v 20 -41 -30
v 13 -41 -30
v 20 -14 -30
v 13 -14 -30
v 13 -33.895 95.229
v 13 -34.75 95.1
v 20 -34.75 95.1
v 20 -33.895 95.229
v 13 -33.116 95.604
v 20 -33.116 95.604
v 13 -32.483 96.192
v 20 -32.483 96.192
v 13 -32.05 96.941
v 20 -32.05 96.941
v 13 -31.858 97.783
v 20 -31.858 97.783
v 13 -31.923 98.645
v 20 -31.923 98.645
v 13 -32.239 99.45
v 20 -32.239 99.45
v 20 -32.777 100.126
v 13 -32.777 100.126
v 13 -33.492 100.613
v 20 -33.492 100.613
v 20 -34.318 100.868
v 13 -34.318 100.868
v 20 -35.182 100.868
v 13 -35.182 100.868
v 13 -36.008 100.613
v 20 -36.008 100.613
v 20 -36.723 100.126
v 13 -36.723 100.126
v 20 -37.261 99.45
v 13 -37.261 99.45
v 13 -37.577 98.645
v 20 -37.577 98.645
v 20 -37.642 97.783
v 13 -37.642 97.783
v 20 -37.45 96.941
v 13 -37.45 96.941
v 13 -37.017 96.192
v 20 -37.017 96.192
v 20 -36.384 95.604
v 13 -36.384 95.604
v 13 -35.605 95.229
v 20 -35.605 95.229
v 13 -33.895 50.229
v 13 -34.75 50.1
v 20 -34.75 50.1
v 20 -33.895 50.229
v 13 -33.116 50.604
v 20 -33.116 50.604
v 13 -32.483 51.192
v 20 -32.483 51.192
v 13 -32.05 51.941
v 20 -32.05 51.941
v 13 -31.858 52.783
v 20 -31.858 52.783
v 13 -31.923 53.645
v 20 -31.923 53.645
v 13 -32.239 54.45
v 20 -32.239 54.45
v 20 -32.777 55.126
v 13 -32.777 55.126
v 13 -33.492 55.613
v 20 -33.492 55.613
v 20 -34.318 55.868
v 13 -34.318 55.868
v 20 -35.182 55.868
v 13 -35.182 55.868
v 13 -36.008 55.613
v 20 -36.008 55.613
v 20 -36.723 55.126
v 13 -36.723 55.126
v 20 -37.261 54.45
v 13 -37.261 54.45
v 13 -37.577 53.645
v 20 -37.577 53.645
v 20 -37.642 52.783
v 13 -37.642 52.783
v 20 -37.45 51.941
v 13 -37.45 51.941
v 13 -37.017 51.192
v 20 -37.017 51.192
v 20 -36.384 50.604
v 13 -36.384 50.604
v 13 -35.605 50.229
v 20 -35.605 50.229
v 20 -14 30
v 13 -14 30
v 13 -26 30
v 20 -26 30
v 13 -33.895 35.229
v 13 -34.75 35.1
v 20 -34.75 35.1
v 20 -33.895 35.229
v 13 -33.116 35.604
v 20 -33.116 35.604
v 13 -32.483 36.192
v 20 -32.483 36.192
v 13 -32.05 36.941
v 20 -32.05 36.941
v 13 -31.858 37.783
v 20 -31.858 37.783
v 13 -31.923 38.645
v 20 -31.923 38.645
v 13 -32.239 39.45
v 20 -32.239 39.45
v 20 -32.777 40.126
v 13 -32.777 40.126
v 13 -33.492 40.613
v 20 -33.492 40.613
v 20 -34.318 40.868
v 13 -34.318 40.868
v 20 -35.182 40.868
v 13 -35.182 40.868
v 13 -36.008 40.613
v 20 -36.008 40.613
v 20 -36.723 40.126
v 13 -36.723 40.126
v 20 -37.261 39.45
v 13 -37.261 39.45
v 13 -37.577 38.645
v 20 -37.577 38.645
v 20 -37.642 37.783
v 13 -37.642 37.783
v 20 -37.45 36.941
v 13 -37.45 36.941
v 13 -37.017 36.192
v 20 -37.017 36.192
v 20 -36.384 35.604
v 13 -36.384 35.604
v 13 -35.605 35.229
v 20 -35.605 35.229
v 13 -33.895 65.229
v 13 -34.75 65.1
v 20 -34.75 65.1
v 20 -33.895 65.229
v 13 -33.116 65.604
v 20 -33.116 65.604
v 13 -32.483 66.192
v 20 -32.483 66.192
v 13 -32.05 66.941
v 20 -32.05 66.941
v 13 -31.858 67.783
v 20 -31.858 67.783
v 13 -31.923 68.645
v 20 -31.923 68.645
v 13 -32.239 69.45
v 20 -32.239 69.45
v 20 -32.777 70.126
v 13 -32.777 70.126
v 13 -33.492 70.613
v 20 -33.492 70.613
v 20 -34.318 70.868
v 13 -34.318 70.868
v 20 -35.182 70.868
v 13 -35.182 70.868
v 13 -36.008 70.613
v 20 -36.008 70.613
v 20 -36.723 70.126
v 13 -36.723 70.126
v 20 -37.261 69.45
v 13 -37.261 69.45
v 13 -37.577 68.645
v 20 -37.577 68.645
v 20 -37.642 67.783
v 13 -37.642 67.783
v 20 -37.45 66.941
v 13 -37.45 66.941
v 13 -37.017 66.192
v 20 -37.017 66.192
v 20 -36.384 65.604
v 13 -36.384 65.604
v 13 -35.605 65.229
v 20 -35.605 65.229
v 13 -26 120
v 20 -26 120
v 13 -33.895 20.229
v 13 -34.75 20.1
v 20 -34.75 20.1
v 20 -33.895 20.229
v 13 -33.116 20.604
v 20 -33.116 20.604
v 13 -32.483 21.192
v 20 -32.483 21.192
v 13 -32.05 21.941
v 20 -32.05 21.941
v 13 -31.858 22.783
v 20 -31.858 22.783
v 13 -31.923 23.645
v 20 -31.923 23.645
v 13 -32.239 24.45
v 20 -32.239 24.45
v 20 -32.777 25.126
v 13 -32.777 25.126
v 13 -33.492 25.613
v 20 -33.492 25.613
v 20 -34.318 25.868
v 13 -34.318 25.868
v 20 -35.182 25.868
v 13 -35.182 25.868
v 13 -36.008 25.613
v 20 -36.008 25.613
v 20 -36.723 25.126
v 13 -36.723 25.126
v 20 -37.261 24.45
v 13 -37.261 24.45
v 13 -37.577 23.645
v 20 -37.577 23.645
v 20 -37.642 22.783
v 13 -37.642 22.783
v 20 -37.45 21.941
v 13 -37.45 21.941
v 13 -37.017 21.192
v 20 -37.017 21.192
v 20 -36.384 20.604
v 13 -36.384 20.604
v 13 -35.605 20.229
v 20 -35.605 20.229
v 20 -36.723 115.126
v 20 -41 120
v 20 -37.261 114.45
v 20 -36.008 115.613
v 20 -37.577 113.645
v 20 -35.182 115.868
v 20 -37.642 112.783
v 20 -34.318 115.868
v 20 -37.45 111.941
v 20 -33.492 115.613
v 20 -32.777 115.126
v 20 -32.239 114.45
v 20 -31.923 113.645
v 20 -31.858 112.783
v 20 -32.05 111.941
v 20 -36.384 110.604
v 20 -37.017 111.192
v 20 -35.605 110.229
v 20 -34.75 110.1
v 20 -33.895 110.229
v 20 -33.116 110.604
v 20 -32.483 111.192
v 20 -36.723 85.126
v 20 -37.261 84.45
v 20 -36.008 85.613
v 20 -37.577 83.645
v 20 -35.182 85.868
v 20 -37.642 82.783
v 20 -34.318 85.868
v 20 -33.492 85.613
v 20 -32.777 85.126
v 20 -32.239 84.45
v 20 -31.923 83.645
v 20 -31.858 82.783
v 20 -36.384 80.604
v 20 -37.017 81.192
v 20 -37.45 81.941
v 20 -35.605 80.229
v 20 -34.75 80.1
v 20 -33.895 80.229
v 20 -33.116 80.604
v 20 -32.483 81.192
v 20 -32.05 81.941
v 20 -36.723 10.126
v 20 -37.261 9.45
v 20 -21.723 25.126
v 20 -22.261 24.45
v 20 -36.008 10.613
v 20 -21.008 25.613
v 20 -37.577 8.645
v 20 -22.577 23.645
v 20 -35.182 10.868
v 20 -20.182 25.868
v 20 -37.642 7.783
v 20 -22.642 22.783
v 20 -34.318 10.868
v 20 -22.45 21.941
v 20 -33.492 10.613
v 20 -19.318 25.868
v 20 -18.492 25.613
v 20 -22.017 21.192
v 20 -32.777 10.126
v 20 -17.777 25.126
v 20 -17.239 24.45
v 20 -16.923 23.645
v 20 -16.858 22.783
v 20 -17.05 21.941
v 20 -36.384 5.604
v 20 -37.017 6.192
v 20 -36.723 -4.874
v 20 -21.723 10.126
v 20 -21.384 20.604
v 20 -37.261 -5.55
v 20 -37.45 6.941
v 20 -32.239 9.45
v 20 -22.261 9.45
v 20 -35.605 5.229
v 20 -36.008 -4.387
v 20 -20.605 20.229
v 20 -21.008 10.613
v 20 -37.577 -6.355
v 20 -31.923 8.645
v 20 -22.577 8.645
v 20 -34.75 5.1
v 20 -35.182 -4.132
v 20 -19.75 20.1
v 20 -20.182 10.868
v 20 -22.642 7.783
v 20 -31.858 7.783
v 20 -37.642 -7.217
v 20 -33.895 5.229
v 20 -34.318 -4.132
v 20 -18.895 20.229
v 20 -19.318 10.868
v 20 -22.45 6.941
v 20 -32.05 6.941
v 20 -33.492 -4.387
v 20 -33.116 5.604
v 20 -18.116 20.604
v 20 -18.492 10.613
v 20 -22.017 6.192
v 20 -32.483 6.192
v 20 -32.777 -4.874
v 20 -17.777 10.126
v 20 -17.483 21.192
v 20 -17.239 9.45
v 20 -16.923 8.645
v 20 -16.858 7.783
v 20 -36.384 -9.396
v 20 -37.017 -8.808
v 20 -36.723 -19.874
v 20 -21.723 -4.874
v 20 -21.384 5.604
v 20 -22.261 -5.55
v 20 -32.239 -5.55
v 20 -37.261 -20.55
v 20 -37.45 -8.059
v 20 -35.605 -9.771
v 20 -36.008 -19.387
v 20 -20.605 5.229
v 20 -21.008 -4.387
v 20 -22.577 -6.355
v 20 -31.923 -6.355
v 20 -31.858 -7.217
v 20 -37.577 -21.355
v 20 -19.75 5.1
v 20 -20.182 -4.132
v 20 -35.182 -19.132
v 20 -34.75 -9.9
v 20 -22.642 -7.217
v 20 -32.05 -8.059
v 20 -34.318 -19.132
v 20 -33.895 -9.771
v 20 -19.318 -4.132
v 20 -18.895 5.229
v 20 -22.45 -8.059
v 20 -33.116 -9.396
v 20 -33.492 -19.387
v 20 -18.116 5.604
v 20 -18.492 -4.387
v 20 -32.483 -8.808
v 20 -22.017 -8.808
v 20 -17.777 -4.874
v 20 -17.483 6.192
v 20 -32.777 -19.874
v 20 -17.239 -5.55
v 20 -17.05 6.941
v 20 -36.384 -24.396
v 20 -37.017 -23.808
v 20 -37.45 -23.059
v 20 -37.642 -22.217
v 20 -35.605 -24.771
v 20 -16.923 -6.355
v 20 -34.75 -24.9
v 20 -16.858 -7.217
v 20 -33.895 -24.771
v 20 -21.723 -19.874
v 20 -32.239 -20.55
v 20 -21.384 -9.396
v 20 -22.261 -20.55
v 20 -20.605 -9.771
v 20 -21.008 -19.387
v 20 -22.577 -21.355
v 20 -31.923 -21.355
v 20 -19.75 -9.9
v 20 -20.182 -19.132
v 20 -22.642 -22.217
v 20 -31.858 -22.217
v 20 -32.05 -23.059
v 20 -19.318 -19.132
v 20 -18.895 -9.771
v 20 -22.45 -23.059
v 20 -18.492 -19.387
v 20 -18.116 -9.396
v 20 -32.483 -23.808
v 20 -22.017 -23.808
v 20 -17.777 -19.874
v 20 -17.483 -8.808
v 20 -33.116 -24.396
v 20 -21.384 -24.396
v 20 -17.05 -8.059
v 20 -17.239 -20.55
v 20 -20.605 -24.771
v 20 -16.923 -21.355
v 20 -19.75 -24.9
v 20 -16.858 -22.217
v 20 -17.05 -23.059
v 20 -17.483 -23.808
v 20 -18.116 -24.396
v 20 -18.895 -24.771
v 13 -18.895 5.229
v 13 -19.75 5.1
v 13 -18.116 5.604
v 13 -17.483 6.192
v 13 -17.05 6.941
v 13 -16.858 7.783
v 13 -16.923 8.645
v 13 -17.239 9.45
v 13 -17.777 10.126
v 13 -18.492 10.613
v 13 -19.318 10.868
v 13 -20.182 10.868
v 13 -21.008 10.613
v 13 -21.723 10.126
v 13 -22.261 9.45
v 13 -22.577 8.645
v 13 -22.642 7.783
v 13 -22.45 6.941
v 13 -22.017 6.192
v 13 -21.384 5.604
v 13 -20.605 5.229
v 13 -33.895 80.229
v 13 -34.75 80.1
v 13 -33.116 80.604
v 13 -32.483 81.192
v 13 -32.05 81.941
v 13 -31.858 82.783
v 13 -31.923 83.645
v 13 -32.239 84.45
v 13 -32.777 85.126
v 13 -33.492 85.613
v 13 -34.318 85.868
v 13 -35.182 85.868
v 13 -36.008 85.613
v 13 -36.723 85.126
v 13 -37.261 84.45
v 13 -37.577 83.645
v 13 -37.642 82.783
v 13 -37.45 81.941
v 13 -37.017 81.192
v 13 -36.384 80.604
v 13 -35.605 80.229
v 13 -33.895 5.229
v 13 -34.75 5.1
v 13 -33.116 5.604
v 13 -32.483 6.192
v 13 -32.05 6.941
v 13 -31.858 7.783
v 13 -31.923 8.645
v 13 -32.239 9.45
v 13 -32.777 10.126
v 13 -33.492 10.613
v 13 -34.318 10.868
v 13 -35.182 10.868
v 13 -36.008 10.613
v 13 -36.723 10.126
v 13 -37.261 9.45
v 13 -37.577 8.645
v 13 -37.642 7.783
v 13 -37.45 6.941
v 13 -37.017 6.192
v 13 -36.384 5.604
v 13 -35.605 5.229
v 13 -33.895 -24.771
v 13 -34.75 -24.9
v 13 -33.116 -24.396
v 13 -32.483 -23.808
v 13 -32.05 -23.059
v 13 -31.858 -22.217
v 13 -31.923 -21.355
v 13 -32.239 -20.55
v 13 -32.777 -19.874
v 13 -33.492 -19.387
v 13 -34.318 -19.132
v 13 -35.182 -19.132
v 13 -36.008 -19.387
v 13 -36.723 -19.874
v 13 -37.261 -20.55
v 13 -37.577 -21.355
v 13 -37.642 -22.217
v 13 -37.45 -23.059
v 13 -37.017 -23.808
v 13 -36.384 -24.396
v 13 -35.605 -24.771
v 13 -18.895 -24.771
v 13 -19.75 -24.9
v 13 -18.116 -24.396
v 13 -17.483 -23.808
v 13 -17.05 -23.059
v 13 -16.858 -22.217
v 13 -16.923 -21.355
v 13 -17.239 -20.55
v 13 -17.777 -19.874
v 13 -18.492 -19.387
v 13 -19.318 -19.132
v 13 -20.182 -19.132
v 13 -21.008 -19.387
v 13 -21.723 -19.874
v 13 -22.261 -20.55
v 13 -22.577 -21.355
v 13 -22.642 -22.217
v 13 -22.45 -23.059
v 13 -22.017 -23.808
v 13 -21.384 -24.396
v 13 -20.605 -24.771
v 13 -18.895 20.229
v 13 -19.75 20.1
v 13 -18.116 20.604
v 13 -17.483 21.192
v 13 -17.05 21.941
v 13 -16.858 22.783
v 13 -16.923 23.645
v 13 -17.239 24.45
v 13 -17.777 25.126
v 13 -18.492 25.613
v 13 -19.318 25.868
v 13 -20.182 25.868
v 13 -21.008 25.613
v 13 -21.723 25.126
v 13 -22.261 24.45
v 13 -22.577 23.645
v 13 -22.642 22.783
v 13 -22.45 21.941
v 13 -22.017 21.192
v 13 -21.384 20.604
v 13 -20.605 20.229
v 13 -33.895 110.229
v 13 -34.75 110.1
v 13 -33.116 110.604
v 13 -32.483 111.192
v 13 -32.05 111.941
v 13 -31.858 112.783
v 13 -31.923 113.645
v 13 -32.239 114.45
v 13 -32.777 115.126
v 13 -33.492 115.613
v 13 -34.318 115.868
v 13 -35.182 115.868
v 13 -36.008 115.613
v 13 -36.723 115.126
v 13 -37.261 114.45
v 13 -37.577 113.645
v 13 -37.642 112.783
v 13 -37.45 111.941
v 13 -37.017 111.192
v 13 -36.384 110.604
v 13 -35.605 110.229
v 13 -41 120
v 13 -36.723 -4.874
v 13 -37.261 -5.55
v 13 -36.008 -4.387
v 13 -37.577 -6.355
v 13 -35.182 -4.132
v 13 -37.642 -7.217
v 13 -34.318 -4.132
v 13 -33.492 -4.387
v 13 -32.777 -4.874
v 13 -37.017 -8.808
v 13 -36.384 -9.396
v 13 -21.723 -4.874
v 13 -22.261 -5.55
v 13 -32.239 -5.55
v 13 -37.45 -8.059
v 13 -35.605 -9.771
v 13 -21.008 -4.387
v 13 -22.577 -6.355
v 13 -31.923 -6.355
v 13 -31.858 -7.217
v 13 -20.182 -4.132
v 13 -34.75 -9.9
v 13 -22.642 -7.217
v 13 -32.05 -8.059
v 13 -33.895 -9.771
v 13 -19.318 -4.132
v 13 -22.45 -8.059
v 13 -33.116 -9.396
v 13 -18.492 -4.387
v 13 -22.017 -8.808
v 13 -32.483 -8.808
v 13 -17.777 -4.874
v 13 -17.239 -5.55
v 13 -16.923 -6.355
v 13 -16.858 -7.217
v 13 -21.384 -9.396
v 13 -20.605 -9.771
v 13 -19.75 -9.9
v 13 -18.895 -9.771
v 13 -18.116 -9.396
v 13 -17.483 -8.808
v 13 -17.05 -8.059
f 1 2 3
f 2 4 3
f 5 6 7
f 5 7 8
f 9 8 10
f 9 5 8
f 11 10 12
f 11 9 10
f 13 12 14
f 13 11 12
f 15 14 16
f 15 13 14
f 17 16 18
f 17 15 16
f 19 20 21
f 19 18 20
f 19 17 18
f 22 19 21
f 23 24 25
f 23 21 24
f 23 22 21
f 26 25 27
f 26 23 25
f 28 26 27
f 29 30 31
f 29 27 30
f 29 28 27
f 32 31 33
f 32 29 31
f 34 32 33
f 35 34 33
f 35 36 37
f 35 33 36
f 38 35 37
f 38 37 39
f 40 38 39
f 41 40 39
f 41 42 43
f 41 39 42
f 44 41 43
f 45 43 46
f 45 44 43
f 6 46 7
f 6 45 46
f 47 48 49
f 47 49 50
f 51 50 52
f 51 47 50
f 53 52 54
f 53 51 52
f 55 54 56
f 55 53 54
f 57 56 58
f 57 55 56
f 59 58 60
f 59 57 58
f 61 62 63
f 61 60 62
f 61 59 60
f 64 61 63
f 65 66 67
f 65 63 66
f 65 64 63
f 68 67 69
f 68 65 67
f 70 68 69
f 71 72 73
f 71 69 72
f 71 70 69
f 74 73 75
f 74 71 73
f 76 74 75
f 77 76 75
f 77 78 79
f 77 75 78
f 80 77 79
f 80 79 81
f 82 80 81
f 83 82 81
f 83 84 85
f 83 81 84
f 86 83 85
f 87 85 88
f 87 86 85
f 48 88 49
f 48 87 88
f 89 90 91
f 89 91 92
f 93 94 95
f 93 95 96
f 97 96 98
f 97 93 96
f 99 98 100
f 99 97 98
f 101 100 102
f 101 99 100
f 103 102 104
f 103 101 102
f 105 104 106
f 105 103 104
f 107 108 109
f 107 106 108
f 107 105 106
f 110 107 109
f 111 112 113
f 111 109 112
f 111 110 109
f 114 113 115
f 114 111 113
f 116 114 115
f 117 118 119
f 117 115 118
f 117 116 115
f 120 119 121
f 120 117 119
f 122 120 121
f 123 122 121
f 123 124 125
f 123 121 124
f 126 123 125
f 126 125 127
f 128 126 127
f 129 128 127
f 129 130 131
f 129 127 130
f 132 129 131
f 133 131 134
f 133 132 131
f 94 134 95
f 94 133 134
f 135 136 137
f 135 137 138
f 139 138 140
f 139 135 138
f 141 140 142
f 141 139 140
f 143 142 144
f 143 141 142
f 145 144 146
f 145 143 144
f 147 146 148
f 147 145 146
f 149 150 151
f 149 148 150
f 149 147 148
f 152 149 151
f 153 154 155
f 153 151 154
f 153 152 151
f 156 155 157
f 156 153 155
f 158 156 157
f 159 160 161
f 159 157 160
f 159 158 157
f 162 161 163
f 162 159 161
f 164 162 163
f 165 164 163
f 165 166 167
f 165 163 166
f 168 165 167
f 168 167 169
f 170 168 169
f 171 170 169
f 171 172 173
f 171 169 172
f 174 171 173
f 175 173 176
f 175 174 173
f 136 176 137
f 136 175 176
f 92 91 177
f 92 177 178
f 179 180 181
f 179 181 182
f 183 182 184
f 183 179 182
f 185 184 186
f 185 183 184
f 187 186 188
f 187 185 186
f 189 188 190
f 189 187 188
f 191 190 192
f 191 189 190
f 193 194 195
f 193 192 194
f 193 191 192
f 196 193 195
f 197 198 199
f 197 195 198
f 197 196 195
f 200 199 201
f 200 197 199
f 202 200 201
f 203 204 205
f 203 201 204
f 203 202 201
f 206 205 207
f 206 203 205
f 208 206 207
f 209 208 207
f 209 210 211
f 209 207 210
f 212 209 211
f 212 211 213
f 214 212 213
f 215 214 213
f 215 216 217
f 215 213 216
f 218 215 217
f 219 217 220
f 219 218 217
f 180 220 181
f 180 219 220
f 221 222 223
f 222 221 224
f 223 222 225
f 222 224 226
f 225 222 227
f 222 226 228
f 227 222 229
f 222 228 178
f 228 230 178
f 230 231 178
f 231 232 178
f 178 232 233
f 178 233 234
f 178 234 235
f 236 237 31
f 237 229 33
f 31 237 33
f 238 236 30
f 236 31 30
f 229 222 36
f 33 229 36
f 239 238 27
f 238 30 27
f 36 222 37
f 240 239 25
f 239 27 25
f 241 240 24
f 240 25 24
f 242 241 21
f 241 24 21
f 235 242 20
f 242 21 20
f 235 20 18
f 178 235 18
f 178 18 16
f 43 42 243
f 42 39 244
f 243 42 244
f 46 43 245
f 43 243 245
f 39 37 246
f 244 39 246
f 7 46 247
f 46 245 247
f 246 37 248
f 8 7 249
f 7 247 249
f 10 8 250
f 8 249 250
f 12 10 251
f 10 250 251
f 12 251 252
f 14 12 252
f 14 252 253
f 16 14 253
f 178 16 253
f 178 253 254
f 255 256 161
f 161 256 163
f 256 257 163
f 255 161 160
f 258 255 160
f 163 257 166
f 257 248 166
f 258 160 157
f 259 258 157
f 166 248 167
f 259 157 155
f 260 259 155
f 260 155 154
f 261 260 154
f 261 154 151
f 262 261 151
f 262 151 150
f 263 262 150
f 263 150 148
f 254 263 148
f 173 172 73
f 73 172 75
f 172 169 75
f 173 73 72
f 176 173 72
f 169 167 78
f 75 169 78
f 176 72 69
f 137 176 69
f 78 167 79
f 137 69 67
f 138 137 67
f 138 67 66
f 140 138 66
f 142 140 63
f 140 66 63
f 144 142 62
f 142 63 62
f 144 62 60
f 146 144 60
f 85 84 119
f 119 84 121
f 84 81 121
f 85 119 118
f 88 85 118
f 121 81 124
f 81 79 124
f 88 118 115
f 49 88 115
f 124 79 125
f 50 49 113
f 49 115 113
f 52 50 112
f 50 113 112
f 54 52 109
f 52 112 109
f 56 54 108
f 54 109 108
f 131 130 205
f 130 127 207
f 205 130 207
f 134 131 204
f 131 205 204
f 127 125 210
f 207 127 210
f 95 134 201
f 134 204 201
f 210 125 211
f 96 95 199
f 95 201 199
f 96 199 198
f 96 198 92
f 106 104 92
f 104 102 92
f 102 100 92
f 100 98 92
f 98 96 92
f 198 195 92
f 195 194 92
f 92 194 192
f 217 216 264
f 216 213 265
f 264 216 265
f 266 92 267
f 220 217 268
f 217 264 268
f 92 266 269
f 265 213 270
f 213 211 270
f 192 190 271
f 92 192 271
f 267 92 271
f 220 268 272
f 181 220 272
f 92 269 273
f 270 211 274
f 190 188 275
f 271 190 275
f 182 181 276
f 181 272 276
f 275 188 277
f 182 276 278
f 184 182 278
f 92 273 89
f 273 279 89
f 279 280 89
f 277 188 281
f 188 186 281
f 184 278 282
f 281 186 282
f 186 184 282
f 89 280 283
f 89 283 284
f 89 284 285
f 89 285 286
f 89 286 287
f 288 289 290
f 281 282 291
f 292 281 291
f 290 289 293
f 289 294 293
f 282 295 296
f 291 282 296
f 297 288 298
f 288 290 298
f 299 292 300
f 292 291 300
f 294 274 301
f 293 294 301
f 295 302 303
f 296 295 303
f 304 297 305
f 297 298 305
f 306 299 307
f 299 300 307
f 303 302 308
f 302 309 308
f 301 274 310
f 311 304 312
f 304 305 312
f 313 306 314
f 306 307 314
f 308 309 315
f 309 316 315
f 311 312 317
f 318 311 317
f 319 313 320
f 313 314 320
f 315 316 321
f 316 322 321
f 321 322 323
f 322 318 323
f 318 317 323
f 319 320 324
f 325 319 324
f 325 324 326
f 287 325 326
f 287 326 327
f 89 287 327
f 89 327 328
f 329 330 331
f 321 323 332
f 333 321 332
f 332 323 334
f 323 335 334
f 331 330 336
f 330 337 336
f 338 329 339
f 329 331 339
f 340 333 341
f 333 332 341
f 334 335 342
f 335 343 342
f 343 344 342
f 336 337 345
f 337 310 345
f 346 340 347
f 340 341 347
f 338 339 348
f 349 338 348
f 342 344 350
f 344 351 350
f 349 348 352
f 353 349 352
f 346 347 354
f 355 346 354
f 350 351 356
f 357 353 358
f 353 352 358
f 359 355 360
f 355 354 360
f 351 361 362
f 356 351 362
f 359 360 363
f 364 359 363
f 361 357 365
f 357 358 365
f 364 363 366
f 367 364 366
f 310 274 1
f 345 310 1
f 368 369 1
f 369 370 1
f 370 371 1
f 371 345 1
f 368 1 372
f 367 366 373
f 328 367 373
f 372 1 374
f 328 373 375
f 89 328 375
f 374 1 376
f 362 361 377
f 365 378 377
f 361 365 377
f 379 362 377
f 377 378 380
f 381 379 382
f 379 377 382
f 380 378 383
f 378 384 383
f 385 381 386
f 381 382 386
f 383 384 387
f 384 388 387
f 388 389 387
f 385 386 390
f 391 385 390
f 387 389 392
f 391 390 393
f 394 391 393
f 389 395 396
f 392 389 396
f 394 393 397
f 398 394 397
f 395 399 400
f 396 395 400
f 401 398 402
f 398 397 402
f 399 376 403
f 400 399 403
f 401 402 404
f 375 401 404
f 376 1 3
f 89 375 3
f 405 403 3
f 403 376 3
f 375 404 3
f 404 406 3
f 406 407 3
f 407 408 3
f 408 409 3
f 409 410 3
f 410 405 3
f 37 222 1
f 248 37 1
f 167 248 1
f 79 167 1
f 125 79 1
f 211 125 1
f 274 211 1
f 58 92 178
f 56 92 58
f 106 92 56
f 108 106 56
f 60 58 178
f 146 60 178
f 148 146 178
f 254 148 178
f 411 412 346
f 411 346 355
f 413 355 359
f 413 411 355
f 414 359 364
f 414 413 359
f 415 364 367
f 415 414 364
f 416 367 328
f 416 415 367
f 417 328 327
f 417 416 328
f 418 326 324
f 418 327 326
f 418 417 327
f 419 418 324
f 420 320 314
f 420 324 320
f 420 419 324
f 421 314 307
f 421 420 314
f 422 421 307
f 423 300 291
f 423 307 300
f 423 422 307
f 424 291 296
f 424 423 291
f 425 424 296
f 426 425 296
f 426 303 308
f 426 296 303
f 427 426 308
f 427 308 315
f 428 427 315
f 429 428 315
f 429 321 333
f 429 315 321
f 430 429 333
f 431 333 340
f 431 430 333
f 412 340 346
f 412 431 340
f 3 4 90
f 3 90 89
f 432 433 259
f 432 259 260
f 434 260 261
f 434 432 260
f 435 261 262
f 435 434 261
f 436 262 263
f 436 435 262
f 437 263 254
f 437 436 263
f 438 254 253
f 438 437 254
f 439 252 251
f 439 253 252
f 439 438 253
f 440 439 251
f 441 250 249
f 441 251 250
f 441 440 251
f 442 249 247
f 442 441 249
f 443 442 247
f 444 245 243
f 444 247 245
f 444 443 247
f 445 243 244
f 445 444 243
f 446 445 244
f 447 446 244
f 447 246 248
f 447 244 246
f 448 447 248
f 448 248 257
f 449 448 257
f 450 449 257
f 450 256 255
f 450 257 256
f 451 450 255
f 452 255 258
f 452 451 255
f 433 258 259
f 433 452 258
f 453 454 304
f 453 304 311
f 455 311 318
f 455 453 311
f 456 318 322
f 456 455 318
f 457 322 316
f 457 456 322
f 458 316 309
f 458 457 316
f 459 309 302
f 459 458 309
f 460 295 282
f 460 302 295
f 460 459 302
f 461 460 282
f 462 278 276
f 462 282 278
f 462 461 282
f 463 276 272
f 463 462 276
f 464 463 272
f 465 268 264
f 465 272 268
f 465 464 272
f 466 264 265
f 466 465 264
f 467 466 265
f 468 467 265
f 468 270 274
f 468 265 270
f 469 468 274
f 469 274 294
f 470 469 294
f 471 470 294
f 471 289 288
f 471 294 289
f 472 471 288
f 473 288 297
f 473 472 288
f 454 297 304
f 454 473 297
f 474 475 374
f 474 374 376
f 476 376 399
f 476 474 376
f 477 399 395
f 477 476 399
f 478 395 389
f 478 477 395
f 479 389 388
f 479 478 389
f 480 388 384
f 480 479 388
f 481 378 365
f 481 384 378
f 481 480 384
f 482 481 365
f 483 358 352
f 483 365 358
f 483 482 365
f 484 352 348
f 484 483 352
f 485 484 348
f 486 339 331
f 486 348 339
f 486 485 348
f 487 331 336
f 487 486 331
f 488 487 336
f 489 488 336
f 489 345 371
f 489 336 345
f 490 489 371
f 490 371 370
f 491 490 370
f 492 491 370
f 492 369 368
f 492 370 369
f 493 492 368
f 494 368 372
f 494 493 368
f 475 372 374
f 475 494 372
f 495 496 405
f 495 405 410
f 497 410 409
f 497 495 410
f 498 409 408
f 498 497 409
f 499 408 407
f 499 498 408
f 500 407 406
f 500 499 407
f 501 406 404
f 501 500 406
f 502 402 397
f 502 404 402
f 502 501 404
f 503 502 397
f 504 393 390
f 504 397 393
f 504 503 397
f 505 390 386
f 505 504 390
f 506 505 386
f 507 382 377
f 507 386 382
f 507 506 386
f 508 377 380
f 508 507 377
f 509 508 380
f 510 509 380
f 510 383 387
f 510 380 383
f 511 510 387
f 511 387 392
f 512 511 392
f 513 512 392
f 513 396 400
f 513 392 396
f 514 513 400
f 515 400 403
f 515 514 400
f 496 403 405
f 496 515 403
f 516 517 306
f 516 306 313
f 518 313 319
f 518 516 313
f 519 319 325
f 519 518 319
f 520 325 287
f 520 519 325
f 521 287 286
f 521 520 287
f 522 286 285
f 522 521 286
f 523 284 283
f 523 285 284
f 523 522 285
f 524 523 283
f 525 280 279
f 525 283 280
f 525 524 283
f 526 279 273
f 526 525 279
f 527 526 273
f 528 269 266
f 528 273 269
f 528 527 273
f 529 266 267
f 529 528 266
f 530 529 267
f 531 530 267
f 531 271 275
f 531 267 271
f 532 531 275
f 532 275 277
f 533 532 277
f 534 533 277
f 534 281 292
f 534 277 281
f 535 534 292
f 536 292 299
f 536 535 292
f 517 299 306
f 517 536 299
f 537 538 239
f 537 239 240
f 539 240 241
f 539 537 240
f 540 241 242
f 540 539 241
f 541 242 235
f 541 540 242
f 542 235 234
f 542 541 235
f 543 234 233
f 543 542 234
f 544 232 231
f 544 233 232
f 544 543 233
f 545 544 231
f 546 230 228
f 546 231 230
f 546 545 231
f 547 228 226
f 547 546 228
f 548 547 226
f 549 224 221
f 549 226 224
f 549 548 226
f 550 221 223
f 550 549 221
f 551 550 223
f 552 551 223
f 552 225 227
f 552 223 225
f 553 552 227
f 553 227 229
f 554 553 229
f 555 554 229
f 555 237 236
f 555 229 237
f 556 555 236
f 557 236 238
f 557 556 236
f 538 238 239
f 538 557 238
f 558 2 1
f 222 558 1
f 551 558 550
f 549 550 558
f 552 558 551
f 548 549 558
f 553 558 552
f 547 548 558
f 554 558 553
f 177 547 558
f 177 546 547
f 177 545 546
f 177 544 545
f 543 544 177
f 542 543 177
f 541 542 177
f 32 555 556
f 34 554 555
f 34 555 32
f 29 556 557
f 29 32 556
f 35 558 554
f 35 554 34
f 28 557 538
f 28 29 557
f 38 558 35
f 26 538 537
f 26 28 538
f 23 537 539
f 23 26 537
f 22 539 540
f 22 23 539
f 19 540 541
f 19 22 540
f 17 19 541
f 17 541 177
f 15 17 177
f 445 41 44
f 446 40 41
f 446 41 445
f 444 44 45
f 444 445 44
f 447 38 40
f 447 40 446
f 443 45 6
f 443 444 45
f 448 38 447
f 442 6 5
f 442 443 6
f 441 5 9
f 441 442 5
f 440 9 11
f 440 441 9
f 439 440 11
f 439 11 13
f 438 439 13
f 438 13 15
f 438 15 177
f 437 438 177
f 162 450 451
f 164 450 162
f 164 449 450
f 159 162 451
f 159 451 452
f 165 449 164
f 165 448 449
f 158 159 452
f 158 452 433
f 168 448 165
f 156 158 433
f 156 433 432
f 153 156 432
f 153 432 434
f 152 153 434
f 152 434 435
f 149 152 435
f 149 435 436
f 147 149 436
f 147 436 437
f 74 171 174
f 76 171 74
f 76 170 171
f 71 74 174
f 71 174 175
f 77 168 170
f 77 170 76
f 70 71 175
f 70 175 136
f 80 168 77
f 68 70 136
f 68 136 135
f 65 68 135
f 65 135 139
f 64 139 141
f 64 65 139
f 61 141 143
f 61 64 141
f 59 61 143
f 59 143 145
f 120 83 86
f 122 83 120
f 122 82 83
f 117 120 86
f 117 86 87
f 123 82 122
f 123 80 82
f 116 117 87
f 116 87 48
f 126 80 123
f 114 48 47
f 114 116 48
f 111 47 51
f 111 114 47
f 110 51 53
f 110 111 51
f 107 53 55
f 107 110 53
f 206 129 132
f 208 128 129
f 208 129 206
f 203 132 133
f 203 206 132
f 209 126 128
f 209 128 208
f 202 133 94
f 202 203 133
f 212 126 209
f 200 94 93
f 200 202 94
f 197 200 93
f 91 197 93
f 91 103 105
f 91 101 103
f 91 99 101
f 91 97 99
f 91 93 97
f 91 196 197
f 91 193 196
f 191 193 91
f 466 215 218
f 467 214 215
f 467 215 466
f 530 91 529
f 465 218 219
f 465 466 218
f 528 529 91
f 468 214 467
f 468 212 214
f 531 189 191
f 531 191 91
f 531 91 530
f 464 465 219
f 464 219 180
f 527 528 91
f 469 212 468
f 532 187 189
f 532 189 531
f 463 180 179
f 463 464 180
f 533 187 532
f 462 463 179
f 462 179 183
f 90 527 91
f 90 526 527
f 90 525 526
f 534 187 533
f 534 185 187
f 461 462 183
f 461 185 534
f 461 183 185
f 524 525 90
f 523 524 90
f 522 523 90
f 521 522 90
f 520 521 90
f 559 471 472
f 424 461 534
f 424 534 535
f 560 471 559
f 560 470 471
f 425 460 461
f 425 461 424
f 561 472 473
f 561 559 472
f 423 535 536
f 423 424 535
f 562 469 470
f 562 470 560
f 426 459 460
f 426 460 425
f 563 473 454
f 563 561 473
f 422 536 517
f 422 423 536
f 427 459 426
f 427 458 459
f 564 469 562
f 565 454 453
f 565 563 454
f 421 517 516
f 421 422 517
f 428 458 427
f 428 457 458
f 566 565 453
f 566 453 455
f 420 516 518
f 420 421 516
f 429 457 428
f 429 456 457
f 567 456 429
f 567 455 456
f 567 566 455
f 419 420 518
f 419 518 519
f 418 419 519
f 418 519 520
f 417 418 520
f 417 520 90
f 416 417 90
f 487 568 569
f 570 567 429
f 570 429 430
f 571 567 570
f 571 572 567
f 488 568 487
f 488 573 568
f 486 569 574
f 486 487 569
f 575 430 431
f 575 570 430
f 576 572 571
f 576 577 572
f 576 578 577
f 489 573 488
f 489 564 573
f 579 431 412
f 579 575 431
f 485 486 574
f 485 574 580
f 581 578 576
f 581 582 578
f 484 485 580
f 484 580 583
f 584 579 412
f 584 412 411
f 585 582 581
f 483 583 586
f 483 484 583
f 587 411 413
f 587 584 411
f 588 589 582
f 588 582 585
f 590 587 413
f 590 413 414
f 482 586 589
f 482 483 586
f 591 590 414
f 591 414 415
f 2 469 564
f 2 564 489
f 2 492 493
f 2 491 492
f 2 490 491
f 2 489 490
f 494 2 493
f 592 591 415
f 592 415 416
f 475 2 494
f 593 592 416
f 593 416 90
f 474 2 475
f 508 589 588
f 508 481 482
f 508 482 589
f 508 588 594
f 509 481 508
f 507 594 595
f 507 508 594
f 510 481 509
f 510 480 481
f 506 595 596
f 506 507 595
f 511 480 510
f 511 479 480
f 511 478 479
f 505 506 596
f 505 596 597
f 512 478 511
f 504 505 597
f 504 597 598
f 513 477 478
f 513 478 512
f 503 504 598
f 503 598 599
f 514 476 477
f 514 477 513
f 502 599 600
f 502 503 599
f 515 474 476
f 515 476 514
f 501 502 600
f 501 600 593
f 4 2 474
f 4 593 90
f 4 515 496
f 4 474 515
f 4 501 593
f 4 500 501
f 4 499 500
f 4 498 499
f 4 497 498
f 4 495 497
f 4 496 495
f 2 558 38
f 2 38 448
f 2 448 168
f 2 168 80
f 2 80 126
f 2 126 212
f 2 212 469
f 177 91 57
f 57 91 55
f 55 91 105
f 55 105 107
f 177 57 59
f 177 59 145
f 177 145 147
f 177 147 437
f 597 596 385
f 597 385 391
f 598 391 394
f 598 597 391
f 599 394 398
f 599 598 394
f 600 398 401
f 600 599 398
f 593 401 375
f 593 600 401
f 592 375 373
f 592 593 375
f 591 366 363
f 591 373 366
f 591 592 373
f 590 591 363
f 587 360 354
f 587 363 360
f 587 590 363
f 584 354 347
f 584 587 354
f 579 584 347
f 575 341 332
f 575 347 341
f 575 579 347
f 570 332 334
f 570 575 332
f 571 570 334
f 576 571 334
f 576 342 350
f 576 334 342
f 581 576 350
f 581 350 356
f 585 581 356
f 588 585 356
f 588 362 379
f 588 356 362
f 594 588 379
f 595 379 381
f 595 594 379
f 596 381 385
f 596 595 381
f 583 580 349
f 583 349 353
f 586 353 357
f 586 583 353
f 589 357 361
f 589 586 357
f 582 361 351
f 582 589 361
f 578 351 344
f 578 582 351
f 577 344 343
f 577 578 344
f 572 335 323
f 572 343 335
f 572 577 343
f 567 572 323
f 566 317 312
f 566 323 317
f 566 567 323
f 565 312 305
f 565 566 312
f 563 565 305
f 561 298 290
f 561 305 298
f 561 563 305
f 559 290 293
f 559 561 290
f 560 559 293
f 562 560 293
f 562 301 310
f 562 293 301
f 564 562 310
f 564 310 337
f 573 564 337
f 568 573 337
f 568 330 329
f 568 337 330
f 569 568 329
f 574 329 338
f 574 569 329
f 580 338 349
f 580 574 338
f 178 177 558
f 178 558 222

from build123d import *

# Parameters (mm, degrees)
CYLINDER021_R     = 2.9
CYLINDER021_DEPTH = 132
CYLINDER022_R     = 2.9
CYLINDER022_DEPTH = 132
CYLINDER023_R     = 2.9
CYLINDER023_DEPTH = 132
CYLINDER024_R     = 2.9
CYLINDER024_DEPTH = 132
CYLINDER025_R     = 2.9
CYLINDER025_DEPTH = 132
CYLINDER026_R     = 2.9
CYLINDER026_DEPTH = 132
CYLINDER027_R     = 2.9
CYLINDER027_DEPTH = 132
CYLINDER028_R     = 2.9
CYLINDER028_DEPTH = 132
CYLINDER029_R     = 2.9
CYLINDER029_DEPTH = 132
CYLINDER030_R     = 2.9
CYLINDER030_DEPTH = 132
CYLINDER031_R     = 2.9
CYLINDER031_DEPTH = 132
CYLINDER032_R     = 2.9
CYLINDER032_DEPTH = 132
CYLINDER033_R     = 2.9
CYLINDER033_DEPTH = 132
CYLINDER034_R     = 2.9
CYLINDER034_DEPTH = 132
CYLINDER035_R     = 2.9
CYLINDER035_DEPTH = 132
CYLINDER036_R     = 2.9
CYLINDER036_DEPTH = 132
CYLINDER037_R     = 2.9
CYLINDER037_DEPTH = 132
CYLINDER038_R     = 2.9
CYLINDER038_DEPTH = 132
CYLINDER039_R     = 2.9
CYLINDER039_DEPTH = 132
CYLINDER020_R     = 2.9
CYLINDER020_DEPTH = 132
CYLINDER001_R     = 2.9
CYLINDER001_DEPTH = 132
CYLINDER002_R     = 2.9
CYLINDER002_DEPTH = 132
CYLINDER003_R     = 2.9
CYLINDER003_DEPTH = 132
CYLINDER004_R     = 2.9
CYLINDER004_DEPTH = 132
CYLINDER005_R     = 2.9
CYLINDER005_DEPTH = 132
CYLINDER006_R     = 2.9
CYLINDER006_DEPTH = 132
CYLINDER007_R     = 2.9
CYLINDER007_DEPTH = 132
CYLINDER008_R     = 2.9
CYLINDER008_DEPTH = 132
CYLINDER009_R     = 2.9
CYLINDER009_DEPTH = 132
CYLINDER010_R     = 2.9
CYLINDER010_DEPTH = 132
CYLINDER011_R     = 2.9
CYLINDER011_DEPTH = 132
CYLINDER012_R     = 2.9
CYLINDER012_DEPTH = 132
CYLINDER013_R     = 2.9
CYLINDER013_DEPTH = 132
CYLINDER014_R     = 2.9
CYLINDER014_DEPTH = 132
CYLINDER015_R     = 2.9
CYLINDER015_DEPTH = 132
CYLINDER016_R     = 2.9
CYLINDER016_DEPTH = 132
CYLINDER017_R     = 2.9
CYLINDER017_DEPTH = 132
CYLINDER018_R     = 2.9
CYLINDER018_DEPTH = 132
CYLINDER019_R     = 2.9
CYLINDER019_DEPTH = 132
CYLINDER_R        = 2.9
CYLINDER_DEPTH    = 132
CUBE001_W         = 7
CUBE001_H         = 15
CUBE001_DEPTH     = 150
CUBE_W            = 7
CUBE_H            = 12
CUBE_DEPTH        = 60


with BuildPart() as cylinder021:
    # cylinder021 → cylinder021 (new body)
    with BuildSketch(Plane(origin=(-66, 0, 25), x_dir=(0, 0, -1), z_dir=(1, 0, 0))):
        Circle(CYLINDER021_R)
    extrude(amount=CYLINDER021_DEPTH)


with BuildPart() as cylinder022:
    # cylinder022 → cylinder022 (new body)
    with BuildSketch(Plane(origin=(-66, 0, 40), x_dir=(0, 0, -1), z_dir=(1, 0, 0))):
        Circle(CYLINDER022_R)
    extrude(amount=CYLINDER022_DEPTH)


with BuildPart() as cylinder023:
    # cylinder023 → cylinder023 (new body)
    with BuildSketch(Plane(origin=(-66, 0, 55), x_dir=(0, 0, -1), z_dir=(1, 0, 0))):
        Circle(CYLINDER023_R)
    extrude(amount=CYLINDER023_DEPTH)


with BuildPart() as cylinder024:
    # cylinder024 → cylinder024 (new body)
    with BuildSketch(Plane(origin=(-66, 0, 70), x_dir=(0, 0, -1), z_dir=(1, 0, 0))):
        Circle(CYLINDER024_R)
    extrude(amount=CYLINDER024_DEPTH)


with BuildPart() as cylinder025:
    # cylinder025 → cylinder025 (new body)
    with BuildSketch(Plane(origin=(-66, 0, 85), x_dir=(0, 0, -1), z_dir=(1, 0, 0))):
        Circle(CYLINDER025_R)
    extrude(amount=CYLINDER025_DEPTH)


with BuildPart() as cylinder026:
    # cylinder026 → cylinder026 (new body)
    with BuildSketch(Plane(origin=(-66, 0, 100), x_dir=(0, 0, -1), z_dir=(1, 0, 0))):
        Circle(CYLINDER026_R)
    extrude(amount=CYLINDER026_DEPTH)


with BuildPart() as cylinder027:
    # cylinder027 → cylinder027 (new body)
    with BuildSketch(Plane(origin=(-66, 0, 115), x_dir=(0, 0, -1), z_dir=(1, 0, 0))):
        Circle(CYLINDER027_R)
    extrude(amount=CYLINDER027_DEPTH)


with BuildPart() as cylinder028:
    # cylinder028 → cylinder028 (new body)
    with BuildSketch(Plane(origin=(-66, 0, 130), x_dir=(0, 0, -1), z_dir=(1, 0, 0))):
        Circle(CYLINDER028_R)
    extrude(amount=CYLINDER028_DEPTH)


with BuildPart() as cylinder029:
    # cylinder029 → cylinder029 (new body)
    with BuildSketch(Plane(origin=(-66, 0, 145), x_dir=(0, 0, -1), z_dir=(1, 0, 0))):
        Circle(CYLINDER029_R)
    extrude(amount=CYLINDER029_DEPTH)


with BuildPart() as cylinder030:
    # cylinder030 → cylinder030 (new body)
    with BuildSketch(Plane(origin=(-66, 0, 160), x_dir=(0, 0, -1), z_dir=(1, 0, 0))):
        Circle(CYLINDER030_R)
    extrude(amount=CYLINDER030_DEPTH)


with BuildPart() as cylinder031:
    # cylinder031 → cylinder031 (new body)
    with BuildSketch(Plane(origin=(-66, 0, 175), x_dir=(0, 0, -1), z_dir=(1, 0, 0))):
        Circle(CYLINDER031_R)
    extrude(amount=CYLINDER031_DEPTH)


with BuildPart() as cylinder032:
    # cylinder032 → cylinder032 (new body)
    with BuildSketch(Plane(origin=(-66, 0, 190), x_dir=(0, 0, -1), z_dir=(1, 0, 0))):
        Circle(CYLINDER032_R)
    extrude(amount=CYLINDER032_DEPTH)


with BuildPart() as cylinder033:
    # cylinder033 → cylinder033 (new body)
    with BuildSketch(Plane(origin=(-66, 0, 205), x_dir=(0, 0, -1), z_dir=(1, 0, 0))):
        Circle(CYLINDER033_R)
    extrude(amount=CYLINDER033_DEPTH)


with BuildPart() as cylinder034:
    # cylinder034 → cylinder034 (new body)
    with BuildSketch(Plane(origin=(-66, 0, 220), x_dir=(0, 0, -1), z_dir=(1, 0, 0))):
        Circle(CYLINDER034_R)
    extrude(amount=CYLINDER034_DEPTH)


with BuildPart() as cylinder035:
    # cylinder035 → cylinder035 (new body)
    with BuildSketch(Plane(origin=(-66, 0, 235), x_dir=(0, 0, -1), z_dir=(1, 0, 0))):
        Circle(CYLINDER035_R)
    extrude(amount=CYLINDER035_DEPTH)


with BuildPart() as cylinder036:
    # cylinder036 → cylinder036 (new body)
    with BuildSketch(Plane(origin=(-66, 0, 250), x_dir=(0, 0, -1), z_dir=(1, 0, 0))):
        Circle(CYLINDER036_R)
    extrude(amount=CYLINDER036_DEPTH)


with BuildPart() as cylinder037:
    # cylinder037 → cylinder037 (new body)
    with BuildSketch(Plane(origin=(-66, 0, 265), x_dir=(0, 0, -1), z_dir=(1, 0, 0))):
        Circle(CYLINDER037_R)
    extrude(amount=CYLINDER037_DEPTH)


with BuildPart() as cylinder038:
    # cylinder038 → cylinder038 (new body)
    with BuildSketch(Plane(origin=(-66, 0, 280), x_dir=(0, 0, -1), z_dir=(1, 0, 0))):
        Circle(CYLINDER038_R)
    extrude(amount=CYLINDER038_DEPTH)


with BuildPart() as cylinder039:
    # cylinder039 → cylinder039 (new body)
    with BuildSketch(Plane(origin=(-66, 0, 295), x_dir=(0, 0, -1), z_dir=(1, 0, 0))):
        Circle(CYLINDER039_R)
    extrude(amount=CYLINDER039_DEPTH)


with BuildPart() as group001:
    # cylinder020 → cylinder020 (new body)
    with BuildSketch(Plane(origin=(-66, 0, 10), x_dir=(0, 0, -1), z_dir=(1, 0, 0))):
        Circle(CYLINDER020_R)
    extrude(amount=CYLINDER020_DEPTH)

    # Group001: union cylinder021, cylinder022, cylinder023, cylinder024, cylinder025, cylinder026, cylinder027, cylinder028, cylinder029, cylinder030, cylinder031, cylinder032, cylinder033, cylinder034, cylinder035, cylinder036, cylinder037, cylinder038, cylinder039
    add(cylinder021.part)
    add(cylinder022.part)
    add(cylinder023.part)
    add(cylinder024.part)
    add(cylinder025.part)
    add(cylinder026.part)
    add(cylinder027.part)
    add(cylinder028.part)
    add(cylinder029.part)
    add(cylinder030.part)
    add(cylinder031.part)
    add(cylinder032.part)
    add(cylinder033.part)
    add(cylinder034.part)
    add(cylinder035.part)
    add(cylinder036.part)
    add(cylinder037.part)
    add(cylinder038.part)
    add(cylinder039.part)


with BuildPart() as group001_1:
    # Group001 placement: moved
    add(group001.part.moved(Location((0, -34.75, -32))))


with BuildPart() as cylinder001:
    # cylinder001 → cylinder001 (new body)
    with BuildSketch(Plane(origin=(-66, 0, 25), x_dir=(0, 0, -1), z_dir=(1, 0, 0))):
        Circle(CYLINDER001_R)
    extrude(amount=CYLINDER001_DEPTH)


with BuildPart() as cylinder002:
    # cylinder002 → cylinder002 (new body)
    with BuildSketch(Plane(origin=(-66, 0, 40), x_dir=(0, 0, -1), z_dir=(1, 0, 0))):
        Circle(CYLINDER002_R)
    extrude(amount=CYLINDER002_DEPTH)


with BuildPart() as cylinder003:
    # cylinder003 → cylinder003 (new body)
    with BuildSketch(Plane(origin=(-66, 0, 55), x_dir=(0, 0, -1), z_dir=(1, 0, 0))):
        Circle(CYLINDER003_R)
    extrude(amount=CYLINDER003_DEPTH)


with BuildPart() as cylinder004:
    # cylinder004 → cylinder004 (new body)
    with BuildSketch(Plane(origin=(-66, 0, 70), x_dir=(0, 0, -1), z_dir=(1, 0, 0))):
        Circle(CYLINDER004_R)
    extrude(amount=CYLINDER004_DEPTH)


with BuildPart() as cylinder005:
    # cylinder005 → cylinder005 (new body)
    with BuildSketch(Plane(origin=(-66, 0, 85), x_dir=(0, 0, -1), z_dir=(1, 0, 0))):
        Circle(CYLINDER005_R)
    extrude(amount=CYLINDER005_DEPTH)


with BuildPart() as cylinder006:
    # cylinder006 → cylinder006 (new body)
    with BuildSketch(Plane(origin=(-66, 0, 100), x_dir=(0, 0, -1), z_dir=(1, 0, 0))):
        Circle(CYLINDER006_R)
    extrude(amount=CYLINDER006_DEPTH)


with BuildPart() as cylinder007:
    # cylinder007 → cylinder007 (new body)
    with BuildSketch(Plane(origin=(-66, 0, 115), x_dir=(0, 0, -1), z_dir=(1, 0, 0))):
        Circle(CYLINDER007_R)
    extrude(amount=CYLINDER007_DEPTH)


with BuildPart() as cylinder008:
    # cylinder008 → cylinder008 (new body)
    with BuildSketch(Plane(origin=(-66, 0, 130), x_dir=(0, 0, -1), z_dir=(1, 0, 0))):
        Circle(CYLINDER008_R)
    extrude(amount=CYLINDER008_DEPTH)


with BuildPart() as cylinder009:
    # cylinder009 → cylinder009 (new body)
    with BuildSketch(Plane(origin=(-66, 0, 145), x_dir=(0, 0, -1), z_dir=(1, 0, 0))):
        Circle(CYLINDER009_R)
    extrude(amount=CYLINDER009_DEPTH)


with BuildPart() as cylinder010:
    # cylinder010 → cylinder010 (new body)
    with BuildSketch(Plane(origin=(-66, 0, 160), x_dir=(0, 0, -1), z_dir=(1, 0, 0))):
        Circle(CYLINDER010_R)
    extrude(amount=CYLINDER010_DEPTH)


with BuildPart() as cylinder011:
    # cylinder011 → cylinder011 (new body)
    with BuildSketch(Plane(origin=(-66, 0, 175), x_dir=(0, 0, -1), z_dir=(1, 0, 0))):
        Circle(CYLINDER011_R)
    extrude(amount=CYLINDER011_DEPTH)


with BuildPart() as cylinder012:
    # cylinder012 → cylinder012 (new body)
    with BuildSketch(Plane(origin=(-66, 0, 190), x_dir=(0, 0, -1), z_dir=(1, 0, 0))):
        Circle(CYLINDER012_R)
    extrude(amount=CYLINDER012_DEPTH)


with BuildPart() as cylinder013:
    # cylinder013 → cylinder013 (new body)
    with BuildSketch(Plane(origin=(-66, 0, 205), x_dir=(0, 0, -1), z_dir=(1, 0, 0))):
        Circle(CYLINDER013_R)
    extrude(amount=CYLINDER013_DEPTH)


with BuildPart() as cylinder014:
    # cylinder014 → cylinder014 (new body)
    with BuildSketch(Plane(origin=(-66, 0, 220), x_dir=(0, 0, -1), z_dir=(1, 0, 0))):
        Circle(CYLINDER014_R)
    extrude(amount=CYLINDER014_DEPTH)


with BuildPart() as cylinder015:
    # cylinder015 → cylinder015 (new body)
    with BuildSketch(Plane(origin=(-66, 0, 235), x_dir=(0, 0, -1), z_dir=(1, 0, 0))):
        Circle(CYLINDER015_R)
    extrude(amount=CYLINDER015_DEPTH)


with BuildPart() as cylinder016:
    # cylinder016 → cylinder016 (new body)
    with BuildSketch(Plane(origin=(-66, 0, 250), x_dir=(0, 0, -1), z_dir=(1, 0, 0))):
        Circle(CYLINDER016_R)
    extrude(amount=CYLINDER016_DEPTH)


with BuildPart() as cylinder017:
    # cylinder017 → cylinder017 (new body)
    with BuildSketch(Plane(origin=(-66, 0, 265), x_dir=(0, 0, -1), z_dir=(1, 0, 0))):
        Circle(CYLINDER017_R)
    extrude(amount=CYLINDER017_DEPTH)


with BuildPart() as cylinder018:
    # cylinder018 → cylinder018 (new body)
    with BuildSketch(Plane(origin=(-66, 0, 280), x_dir=(0, 0, -1), z_dir=(1, 0, 0))):
        Circle(CYLINDER018_R)
    extrude(amount=CYLINDER018_DEPTH)


with BuildPart() as cylinder019:
    # cylinder019 → cylinder019 (new body)
    with BuildSketch(Plane(origin=(-66, 0, 295), x_dir=(0, 0, -1), z_dir=(1, 0, 0))):
        Circle(CYLINDER019_R)
    extrude(amount=CYLINDER019_DEPTH)


with BuildPart() as union:
    # cylinder → cylinder (new body)
    with BuildSketch(Plane(origin=(-66, 0, 10), x_dir=(0, 0, -1), z_dir=(1, 0, 0))):
        Circle(CYLINDER_R)
    extrude(amount=CYLINDER_DEPTH)

    # Group: union cylinder001, cylinder002, cylinder003, cylinder004, cylinder005, cylinder006, cylinder007, cylinder008, cylinder009, cylinder010, cylinder011, cylinder012, cylinder013, cylinder014, cylinder015, cylinder016, cylinder017, cylinder018, cylinder019
    add(cylinder001.part)
    add(cylinder002.part)
    add(cylinder003.part)
    add(cylinder004.part)
    add(cylinder005.part)
    add(cylinder006.part)
    add(cylinder007.part)
    add(cylinder008.part)
    add(cylinder009.part)
    add(cylinder010.part)
    add(cylinder011.part)
    add(cylinder012.part)
    add(cylinder013.part)
    add(cylinder014.part)
    add(cylinder015.part)
    add(cylinder016.part)
    add(cylinder017.part)
    add(cylinder018.part)
    add(cylinder019.part)


with BuildPart() as union_1:
    # Group placement: moved
    add(union.part.moved(Location((0, -19.75, -32))))

    # union: union Group001
    add(group001_1.part)


with BuildPart() as cube001:
    # cube001 → cube001 (new body)
    with BuildSketch(Plane(origin=(-3.5, -21, -30), x_dir=(1, 0, 0), z_dir=(0, 0, 1))):
        with Locations((3.5, 7.5)):
            Rectangle(CUBE001_W, CUBE001_H)
    extrude(amount=CUBE001_DEPTH)


with BuildPart() as difference:
    # cube → cube (new body)
    with BuildSketch(Plane(origin=(-3.5, -6, -30), x_dir=(1, 0, 0), z_dir=(0, 0, 1))):
        with Locations((3.5, 6)):
            Rectangle(CUBE_W, CUBE_H)
    extrude(amount=CUBE_DEPTH)

    # Matrix_Union: union cube001
    add(cube001.part)


with BuildPart() as difference_1:
    # Matrix_Union placement: moved
    add(difference.part.moved(Location((16.5, -20, 0))))

    # difference: cut union
    add(union_1.part, mode=Mode.SUBTRACT)


solid = difference_1.part
